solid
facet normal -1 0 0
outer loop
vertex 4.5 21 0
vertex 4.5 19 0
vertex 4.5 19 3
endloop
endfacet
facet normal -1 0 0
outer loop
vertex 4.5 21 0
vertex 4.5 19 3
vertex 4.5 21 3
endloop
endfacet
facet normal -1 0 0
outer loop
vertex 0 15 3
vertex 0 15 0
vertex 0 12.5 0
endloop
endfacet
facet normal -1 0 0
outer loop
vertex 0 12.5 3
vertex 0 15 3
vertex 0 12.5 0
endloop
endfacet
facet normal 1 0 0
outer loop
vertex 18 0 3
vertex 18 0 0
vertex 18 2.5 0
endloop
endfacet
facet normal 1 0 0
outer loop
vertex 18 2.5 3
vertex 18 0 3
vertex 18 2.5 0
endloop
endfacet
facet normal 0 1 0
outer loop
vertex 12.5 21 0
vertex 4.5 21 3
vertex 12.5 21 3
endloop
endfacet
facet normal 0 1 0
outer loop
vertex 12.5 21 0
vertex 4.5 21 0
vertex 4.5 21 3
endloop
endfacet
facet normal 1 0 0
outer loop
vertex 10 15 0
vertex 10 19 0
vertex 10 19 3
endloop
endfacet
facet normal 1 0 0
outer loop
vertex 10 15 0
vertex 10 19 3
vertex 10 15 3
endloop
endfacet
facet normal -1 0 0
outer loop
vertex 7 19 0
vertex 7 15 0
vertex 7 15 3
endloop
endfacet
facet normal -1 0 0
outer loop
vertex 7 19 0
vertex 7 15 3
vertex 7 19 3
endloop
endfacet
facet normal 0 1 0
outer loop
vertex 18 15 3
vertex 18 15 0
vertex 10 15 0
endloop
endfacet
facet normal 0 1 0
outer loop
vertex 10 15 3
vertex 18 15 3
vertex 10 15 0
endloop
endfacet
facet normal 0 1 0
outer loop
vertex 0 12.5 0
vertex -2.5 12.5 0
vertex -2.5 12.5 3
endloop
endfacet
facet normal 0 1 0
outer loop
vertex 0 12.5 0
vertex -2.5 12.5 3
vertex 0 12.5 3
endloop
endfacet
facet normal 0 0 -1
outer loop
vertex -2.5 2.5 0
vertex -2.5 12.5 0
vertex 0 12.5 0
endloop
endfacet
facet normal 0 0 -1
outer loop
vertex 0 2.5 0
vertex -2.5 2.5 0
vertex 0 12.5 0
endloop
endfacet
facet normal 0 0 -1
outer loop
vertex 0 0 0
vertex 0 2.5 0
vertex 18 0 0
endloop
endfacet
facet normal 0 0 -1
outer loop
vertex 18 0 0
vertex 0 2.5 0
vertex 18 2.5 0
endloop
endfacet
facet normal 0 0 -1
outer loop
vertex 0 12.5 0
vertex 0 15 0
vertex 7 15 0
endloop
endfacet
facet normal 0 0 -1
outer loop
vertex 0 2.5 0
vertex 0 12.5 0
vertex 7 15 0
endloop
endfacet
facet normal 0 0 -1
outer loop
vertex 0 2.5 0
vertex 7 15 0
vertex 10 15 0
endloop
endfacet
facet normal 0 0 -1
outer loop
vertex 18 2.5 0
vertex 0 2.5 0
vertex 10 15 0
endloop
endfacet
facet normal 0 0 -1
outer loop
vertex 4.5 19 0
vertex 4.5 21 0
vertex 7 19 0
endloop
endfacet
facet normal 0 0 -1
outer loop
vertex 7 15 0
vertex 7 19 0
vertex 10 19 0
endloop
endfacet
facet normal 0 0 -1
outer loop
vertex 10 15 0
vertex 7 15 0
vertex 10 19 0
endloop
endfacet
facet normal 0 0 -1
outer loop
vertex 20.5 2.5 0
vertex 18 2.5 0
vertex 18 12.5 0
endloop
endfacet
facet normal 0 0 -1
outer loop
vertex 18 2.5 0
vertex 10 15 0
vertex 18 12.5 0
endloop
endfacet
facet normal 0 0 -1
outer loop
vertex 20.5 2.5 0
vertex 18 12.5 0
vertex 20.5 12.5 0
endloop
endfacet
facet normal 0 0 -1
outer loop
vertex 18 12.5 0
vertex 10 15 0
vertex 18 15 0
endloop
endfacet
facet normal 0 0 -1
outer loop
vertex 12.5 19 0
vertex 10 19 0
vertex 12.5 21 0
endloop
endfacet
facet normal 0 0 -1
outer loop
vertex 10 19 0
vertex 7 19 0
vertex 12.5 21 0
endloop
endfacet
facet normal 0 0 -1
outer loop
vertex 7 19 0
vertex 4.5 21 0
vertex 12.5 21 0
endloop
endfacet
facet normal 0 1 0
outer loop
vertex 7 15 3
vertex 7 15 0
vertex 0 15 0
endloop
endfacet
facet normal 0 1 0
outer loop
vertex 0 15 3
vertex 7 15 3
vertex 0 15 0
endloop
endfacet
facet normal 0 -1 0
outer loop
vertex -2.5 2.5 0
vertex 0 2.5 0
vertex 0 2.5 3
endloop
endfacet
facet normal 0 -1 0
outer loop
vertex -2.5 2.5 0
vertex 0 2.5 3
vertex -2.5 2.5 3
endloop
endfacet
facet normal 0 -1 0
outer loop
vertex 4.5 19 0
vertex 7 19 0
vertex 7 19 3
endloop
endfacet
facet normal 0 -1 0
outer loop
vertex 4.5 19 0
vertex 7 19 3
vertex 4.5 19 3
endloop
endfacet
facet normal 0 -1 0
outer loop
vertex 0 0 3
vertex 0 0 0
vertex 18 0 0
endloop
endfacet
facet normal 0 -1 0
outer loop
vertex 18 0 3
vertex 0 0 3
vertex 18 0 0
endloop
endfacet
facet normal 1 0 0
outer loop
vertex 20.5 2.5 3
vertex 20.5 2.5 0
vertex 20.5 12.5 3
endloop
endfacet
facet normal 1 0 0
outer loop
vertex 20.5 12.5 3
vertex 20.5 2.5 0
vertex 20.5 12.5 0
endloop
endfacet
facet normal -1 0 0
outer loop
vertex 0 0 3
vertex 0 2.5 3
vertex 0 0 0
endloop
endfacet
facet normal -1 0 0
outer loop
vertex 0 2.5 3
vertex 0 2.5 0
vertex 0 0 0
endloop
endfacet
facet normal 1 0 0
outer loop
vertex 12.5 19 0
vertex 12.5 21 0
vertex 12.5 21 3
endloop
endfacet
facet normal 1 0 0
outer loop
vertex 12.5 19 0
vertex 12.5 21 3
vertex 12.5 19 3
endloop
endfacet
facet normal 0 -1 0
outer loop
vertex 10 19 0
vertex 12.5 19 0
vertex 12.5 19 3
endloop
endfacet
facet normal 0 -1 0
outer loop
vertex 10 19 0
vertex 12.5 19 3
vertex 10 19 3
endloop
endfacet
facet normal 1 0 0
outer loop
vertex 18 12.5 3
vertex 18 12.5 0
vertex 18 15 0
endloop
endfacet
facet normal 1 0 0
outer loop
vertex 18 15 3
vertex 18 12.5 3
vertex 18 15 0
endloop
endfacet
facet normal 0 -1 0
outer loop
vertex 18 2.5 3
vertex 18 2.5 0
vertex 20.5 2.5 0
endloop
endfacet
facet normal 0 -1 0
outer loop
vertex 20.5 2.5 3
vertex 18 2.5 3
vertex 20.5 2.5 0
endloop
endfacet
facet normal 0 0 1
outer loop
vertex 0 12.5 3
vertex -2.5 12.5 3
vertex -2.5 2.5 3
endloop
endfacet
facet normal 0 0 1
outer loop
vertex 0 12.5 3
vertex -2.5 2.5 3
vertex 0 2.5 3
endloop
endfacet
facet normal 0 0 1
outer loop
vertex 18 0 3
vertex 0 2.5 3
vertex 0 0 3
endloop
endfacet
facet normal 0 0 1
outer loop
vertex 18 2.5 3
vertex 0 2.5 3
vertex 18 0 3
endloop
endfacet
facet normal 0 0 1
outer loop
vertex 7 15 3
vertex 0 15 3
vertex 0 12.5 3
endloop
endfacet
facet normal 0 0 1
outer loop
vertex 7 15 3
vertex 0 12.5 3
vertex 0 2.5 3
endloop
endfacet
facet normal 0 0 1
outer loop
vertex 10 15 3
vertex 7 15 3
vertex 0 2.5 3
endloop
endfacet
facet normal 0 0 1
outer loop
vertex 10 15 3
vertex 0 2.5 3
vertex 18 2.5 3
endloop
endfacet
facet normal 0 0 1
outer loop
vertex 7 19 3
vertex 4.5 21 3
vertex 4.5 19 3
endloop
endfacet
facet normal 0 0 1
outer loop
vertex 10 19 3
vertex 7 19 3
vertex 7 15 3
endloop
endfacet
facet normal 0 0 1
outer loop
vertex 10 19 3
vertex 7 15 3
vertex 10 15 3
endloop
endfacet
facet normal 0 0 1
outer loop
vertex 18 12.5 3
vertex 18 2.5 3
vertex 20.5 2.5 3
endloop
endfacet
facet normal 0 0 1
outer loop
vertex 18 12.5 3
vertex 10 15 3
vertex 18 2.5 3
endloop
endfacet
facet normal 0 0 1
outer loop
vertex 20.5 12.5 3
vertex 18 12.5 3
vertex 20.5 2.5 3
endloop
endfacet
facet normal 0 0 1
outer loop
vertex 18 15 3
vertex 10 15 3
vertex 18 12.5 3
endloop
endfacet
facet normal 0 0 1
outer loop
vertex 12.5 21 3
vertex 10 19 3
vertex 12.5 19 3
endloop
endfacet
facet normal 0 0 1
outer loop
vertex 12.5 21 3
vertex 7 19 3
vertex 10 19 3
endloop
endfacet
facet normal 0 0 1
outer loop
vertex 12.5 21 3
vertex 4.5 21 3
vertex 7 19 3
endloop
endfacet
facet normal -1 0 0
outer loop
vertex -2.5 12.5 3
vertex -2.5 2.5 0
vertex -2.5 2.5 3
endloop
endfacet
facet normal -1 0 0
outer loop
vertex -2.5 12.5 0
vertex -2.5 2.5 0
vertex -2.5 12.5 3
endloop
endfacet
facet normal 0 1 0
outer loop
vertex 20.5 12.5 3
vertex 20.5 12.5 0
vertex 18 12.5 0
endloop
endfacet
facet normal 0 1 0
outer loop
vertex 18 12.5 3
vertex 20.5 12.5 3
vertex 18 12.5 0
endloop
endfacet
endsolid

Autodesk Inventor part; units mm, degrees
ref_plane "YZ Plane" through (0, 0, 0) normal (1, 0, 0) x (0, 1, 0)
ref_plane "XZ Plane" through (0, 0, 0) normal (0, 1, 0) x (-1, 0, 0)
ref_plane "XY Plane" through (0, 0, 0) normal (0, 0, 1) x (1, 0, 0)
sketch "Sketch1" plane through (0, 0, 0) normal (0, 0, 1) x (1, 0, 0)
  line L0 (0, 0) -> (18, 0)
  line L1 (18, 0) -> (18, 15)
  line L2 (18, 15) -> (0, 15)
  line L3 (0, 15) -> (0, 0)
  line L4 (20.5, 12.5) -> (18, 12.5)
  line L5 (18, 12.5) -> (18, 2.5)
  line L6 (18, 2.5) -> (20.5, 2.5)
  line L7 (20.5, 2.5) -> (20.5, 12.5)
  line L8 (20.5, 12.5) -> (18, 2.5) construction
  line L9 (18, 12.5) -> (20.5, 2.5) construction
  line L10 (-2.5, 12.5) -> (0, 12.5)
  line L11 (0, 12.5) -> (0, 2.5)
  line L12 (0, 2.5) -> (-2.5, 2.5)
  line L13 (-2.5, 2.5) -> (-2.5, 12.5)
  line L14 (-2.5, 12.5) -> (0, 2.5) construction
  line L15 (0, 12.5) -> (-2.5, 2.5) construction
  line L16 (7, 15) -> (7, 19)
  line L17 (7, 19) -> (4.5, 19)
  line L18 (4.5, 19) -> (4.5, 21)
  line L19 (4.5, 21) -> (12.5, 21)
  line L20 (12.5, 21) -> (12.5, 19)
  line L21 (12.5, 19) -> (10, 19)
  line L22 (10, 19) -> (10, 15)
  point P0 (19.25, 7.5)
  point P1 (-1.25, 7.5)
  point P2 (18, 7.5)
  point P3 (0, 7.5)
  point P4 (0, 12.5)
  dimension "d0" = 18
  dimension "d1" = 15
  dimension "d2" = 2.5
  dimension "d3" = 2.5
  dimension "d4" = 10
  dimension "d5" = 4
  dimension "d6" = 2.5
  dimension "d7" = 2
  dimension "d8" = 8
  dimension "d9" = 2
  dimension "d10" = 2.5
  dimension "d11" = 7
extrude "Extrusion1" add sketch "Sketch1" along normal blind 3
properties part number "Spring_holder"
